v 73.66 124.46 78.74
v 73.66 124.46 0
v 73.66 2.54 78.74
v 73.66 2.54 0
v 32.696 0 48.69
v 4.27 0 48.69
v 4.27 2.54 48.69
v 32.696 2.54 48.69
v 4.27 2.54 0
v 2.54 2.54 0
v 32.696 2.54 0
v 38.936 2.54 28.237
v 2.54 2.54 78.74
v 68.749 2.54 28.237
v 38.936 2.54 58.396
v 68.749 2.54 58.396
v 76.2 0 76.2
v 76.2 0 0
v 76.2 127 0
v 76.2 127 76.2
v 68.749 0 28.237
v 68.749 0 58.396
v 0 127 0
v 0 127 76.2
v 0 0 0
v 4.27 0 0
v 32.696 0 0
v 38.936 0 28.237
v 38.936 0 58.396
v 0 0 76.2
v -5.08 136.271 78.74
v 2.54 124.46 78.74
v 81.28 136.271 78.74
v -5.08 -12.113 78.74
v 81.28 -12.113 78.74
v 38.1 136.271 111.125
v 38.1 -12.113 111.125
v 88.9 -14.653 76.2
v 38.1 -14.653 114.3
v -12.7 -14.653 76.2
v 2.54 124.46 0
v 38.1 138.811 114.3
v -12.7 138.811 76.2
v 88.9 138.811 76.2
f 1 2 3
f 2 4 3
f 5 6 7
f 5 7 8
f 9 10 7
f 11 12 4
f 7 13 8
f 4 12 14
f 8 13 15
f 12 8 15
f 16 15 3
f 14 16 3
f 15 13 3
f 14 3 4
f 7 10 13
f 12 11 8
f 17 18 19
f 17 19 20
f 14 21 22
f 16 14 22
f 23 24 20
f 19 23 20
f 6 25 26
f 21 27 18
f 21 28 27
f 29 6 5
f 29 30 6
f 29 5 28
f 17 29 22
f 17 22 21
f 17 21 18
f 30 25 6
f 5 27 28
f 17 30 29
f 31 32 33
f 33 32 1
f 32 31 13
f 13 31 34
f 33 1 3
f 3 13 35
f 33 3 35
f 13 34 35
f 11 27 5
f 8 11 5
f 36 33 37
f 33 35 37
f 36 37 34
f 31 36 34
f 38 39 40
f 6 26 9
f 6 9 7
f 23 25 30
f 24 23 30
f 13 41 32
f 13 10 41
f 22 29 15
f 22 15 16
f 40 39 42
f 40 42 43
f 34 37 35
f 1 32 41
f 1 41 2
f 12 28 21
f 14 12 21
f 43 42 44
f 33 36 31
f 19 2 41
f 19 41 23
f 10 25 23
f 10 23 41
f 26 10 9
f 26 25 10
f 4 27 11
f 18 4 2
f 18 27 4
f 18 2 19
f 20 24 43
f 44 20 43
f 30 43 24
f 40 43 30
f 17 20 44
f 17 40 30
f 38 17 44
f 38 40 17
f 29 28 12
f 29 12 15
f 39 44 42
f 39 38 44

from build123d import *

# Parameters (mm, degrees)
F0_W          = 76.2
F0_H          = 76.2
F1_DEPTH      = 127
F3_DEPTH      = 14.65342
F3_DEPTH_BACK = 138.81125
F4_T          = -2.54
F6_W          = 29.8130884767
F6_H          = 30.159747228
F6_W_2        = 28.4264292568
F6_H_2        = 48.6897528172
F7_DEPTH      = 25.4


with BuildPart() as f1:
    # F0 (on Front) → F1 (new body)
    with BuildSketch(Plane.XZ):
        with Locations((38.1, 38.1)):
            Rectangle(F0_W, F0_H)
    extrude(amount=-F1_DEPTH)

    # F2 (on Front) → F3 (join, two sides)
    with BuildSketch(Plane.XZ) as f3_sk:
        Polygon((38.1, 114.3), (38.1, 76.2), (76.2, 76.2), (88.9, 76.2), align=None)
        Polygon((-12.7, 76.2), (0, 76.2), (38.1, 76.2), (38.1, 114.3), align=None)
    extrude(amount=F3_DEPTH)
    extrude(f3_sk.sketch, amount=-F3_DEPTH_BACK)

    # F4
    f4_openings = [f1.faces().sort_by_distance(p)[0] for p in [
        (38.1, 63.5, 0),
    ]]
    offset(amount=F4_T, openings=f4_openings, kind=Kind.INTERSECTION)

    # F6 (on Front) → F7 (cut)
    with BuildSketch(Plane.XZ):
        with Locations((53.8429357111, 43.3164620772)):
            Rectangle(F6_W, F6_H)
        with Locations((18.4832299128, 24.3448764086)):
            Rectangle(F6_W_2, F6_H_2)
    extrude(amount=-F7_DEPTH, mode=Mode.SUBTRACT)


solid = f1.part
